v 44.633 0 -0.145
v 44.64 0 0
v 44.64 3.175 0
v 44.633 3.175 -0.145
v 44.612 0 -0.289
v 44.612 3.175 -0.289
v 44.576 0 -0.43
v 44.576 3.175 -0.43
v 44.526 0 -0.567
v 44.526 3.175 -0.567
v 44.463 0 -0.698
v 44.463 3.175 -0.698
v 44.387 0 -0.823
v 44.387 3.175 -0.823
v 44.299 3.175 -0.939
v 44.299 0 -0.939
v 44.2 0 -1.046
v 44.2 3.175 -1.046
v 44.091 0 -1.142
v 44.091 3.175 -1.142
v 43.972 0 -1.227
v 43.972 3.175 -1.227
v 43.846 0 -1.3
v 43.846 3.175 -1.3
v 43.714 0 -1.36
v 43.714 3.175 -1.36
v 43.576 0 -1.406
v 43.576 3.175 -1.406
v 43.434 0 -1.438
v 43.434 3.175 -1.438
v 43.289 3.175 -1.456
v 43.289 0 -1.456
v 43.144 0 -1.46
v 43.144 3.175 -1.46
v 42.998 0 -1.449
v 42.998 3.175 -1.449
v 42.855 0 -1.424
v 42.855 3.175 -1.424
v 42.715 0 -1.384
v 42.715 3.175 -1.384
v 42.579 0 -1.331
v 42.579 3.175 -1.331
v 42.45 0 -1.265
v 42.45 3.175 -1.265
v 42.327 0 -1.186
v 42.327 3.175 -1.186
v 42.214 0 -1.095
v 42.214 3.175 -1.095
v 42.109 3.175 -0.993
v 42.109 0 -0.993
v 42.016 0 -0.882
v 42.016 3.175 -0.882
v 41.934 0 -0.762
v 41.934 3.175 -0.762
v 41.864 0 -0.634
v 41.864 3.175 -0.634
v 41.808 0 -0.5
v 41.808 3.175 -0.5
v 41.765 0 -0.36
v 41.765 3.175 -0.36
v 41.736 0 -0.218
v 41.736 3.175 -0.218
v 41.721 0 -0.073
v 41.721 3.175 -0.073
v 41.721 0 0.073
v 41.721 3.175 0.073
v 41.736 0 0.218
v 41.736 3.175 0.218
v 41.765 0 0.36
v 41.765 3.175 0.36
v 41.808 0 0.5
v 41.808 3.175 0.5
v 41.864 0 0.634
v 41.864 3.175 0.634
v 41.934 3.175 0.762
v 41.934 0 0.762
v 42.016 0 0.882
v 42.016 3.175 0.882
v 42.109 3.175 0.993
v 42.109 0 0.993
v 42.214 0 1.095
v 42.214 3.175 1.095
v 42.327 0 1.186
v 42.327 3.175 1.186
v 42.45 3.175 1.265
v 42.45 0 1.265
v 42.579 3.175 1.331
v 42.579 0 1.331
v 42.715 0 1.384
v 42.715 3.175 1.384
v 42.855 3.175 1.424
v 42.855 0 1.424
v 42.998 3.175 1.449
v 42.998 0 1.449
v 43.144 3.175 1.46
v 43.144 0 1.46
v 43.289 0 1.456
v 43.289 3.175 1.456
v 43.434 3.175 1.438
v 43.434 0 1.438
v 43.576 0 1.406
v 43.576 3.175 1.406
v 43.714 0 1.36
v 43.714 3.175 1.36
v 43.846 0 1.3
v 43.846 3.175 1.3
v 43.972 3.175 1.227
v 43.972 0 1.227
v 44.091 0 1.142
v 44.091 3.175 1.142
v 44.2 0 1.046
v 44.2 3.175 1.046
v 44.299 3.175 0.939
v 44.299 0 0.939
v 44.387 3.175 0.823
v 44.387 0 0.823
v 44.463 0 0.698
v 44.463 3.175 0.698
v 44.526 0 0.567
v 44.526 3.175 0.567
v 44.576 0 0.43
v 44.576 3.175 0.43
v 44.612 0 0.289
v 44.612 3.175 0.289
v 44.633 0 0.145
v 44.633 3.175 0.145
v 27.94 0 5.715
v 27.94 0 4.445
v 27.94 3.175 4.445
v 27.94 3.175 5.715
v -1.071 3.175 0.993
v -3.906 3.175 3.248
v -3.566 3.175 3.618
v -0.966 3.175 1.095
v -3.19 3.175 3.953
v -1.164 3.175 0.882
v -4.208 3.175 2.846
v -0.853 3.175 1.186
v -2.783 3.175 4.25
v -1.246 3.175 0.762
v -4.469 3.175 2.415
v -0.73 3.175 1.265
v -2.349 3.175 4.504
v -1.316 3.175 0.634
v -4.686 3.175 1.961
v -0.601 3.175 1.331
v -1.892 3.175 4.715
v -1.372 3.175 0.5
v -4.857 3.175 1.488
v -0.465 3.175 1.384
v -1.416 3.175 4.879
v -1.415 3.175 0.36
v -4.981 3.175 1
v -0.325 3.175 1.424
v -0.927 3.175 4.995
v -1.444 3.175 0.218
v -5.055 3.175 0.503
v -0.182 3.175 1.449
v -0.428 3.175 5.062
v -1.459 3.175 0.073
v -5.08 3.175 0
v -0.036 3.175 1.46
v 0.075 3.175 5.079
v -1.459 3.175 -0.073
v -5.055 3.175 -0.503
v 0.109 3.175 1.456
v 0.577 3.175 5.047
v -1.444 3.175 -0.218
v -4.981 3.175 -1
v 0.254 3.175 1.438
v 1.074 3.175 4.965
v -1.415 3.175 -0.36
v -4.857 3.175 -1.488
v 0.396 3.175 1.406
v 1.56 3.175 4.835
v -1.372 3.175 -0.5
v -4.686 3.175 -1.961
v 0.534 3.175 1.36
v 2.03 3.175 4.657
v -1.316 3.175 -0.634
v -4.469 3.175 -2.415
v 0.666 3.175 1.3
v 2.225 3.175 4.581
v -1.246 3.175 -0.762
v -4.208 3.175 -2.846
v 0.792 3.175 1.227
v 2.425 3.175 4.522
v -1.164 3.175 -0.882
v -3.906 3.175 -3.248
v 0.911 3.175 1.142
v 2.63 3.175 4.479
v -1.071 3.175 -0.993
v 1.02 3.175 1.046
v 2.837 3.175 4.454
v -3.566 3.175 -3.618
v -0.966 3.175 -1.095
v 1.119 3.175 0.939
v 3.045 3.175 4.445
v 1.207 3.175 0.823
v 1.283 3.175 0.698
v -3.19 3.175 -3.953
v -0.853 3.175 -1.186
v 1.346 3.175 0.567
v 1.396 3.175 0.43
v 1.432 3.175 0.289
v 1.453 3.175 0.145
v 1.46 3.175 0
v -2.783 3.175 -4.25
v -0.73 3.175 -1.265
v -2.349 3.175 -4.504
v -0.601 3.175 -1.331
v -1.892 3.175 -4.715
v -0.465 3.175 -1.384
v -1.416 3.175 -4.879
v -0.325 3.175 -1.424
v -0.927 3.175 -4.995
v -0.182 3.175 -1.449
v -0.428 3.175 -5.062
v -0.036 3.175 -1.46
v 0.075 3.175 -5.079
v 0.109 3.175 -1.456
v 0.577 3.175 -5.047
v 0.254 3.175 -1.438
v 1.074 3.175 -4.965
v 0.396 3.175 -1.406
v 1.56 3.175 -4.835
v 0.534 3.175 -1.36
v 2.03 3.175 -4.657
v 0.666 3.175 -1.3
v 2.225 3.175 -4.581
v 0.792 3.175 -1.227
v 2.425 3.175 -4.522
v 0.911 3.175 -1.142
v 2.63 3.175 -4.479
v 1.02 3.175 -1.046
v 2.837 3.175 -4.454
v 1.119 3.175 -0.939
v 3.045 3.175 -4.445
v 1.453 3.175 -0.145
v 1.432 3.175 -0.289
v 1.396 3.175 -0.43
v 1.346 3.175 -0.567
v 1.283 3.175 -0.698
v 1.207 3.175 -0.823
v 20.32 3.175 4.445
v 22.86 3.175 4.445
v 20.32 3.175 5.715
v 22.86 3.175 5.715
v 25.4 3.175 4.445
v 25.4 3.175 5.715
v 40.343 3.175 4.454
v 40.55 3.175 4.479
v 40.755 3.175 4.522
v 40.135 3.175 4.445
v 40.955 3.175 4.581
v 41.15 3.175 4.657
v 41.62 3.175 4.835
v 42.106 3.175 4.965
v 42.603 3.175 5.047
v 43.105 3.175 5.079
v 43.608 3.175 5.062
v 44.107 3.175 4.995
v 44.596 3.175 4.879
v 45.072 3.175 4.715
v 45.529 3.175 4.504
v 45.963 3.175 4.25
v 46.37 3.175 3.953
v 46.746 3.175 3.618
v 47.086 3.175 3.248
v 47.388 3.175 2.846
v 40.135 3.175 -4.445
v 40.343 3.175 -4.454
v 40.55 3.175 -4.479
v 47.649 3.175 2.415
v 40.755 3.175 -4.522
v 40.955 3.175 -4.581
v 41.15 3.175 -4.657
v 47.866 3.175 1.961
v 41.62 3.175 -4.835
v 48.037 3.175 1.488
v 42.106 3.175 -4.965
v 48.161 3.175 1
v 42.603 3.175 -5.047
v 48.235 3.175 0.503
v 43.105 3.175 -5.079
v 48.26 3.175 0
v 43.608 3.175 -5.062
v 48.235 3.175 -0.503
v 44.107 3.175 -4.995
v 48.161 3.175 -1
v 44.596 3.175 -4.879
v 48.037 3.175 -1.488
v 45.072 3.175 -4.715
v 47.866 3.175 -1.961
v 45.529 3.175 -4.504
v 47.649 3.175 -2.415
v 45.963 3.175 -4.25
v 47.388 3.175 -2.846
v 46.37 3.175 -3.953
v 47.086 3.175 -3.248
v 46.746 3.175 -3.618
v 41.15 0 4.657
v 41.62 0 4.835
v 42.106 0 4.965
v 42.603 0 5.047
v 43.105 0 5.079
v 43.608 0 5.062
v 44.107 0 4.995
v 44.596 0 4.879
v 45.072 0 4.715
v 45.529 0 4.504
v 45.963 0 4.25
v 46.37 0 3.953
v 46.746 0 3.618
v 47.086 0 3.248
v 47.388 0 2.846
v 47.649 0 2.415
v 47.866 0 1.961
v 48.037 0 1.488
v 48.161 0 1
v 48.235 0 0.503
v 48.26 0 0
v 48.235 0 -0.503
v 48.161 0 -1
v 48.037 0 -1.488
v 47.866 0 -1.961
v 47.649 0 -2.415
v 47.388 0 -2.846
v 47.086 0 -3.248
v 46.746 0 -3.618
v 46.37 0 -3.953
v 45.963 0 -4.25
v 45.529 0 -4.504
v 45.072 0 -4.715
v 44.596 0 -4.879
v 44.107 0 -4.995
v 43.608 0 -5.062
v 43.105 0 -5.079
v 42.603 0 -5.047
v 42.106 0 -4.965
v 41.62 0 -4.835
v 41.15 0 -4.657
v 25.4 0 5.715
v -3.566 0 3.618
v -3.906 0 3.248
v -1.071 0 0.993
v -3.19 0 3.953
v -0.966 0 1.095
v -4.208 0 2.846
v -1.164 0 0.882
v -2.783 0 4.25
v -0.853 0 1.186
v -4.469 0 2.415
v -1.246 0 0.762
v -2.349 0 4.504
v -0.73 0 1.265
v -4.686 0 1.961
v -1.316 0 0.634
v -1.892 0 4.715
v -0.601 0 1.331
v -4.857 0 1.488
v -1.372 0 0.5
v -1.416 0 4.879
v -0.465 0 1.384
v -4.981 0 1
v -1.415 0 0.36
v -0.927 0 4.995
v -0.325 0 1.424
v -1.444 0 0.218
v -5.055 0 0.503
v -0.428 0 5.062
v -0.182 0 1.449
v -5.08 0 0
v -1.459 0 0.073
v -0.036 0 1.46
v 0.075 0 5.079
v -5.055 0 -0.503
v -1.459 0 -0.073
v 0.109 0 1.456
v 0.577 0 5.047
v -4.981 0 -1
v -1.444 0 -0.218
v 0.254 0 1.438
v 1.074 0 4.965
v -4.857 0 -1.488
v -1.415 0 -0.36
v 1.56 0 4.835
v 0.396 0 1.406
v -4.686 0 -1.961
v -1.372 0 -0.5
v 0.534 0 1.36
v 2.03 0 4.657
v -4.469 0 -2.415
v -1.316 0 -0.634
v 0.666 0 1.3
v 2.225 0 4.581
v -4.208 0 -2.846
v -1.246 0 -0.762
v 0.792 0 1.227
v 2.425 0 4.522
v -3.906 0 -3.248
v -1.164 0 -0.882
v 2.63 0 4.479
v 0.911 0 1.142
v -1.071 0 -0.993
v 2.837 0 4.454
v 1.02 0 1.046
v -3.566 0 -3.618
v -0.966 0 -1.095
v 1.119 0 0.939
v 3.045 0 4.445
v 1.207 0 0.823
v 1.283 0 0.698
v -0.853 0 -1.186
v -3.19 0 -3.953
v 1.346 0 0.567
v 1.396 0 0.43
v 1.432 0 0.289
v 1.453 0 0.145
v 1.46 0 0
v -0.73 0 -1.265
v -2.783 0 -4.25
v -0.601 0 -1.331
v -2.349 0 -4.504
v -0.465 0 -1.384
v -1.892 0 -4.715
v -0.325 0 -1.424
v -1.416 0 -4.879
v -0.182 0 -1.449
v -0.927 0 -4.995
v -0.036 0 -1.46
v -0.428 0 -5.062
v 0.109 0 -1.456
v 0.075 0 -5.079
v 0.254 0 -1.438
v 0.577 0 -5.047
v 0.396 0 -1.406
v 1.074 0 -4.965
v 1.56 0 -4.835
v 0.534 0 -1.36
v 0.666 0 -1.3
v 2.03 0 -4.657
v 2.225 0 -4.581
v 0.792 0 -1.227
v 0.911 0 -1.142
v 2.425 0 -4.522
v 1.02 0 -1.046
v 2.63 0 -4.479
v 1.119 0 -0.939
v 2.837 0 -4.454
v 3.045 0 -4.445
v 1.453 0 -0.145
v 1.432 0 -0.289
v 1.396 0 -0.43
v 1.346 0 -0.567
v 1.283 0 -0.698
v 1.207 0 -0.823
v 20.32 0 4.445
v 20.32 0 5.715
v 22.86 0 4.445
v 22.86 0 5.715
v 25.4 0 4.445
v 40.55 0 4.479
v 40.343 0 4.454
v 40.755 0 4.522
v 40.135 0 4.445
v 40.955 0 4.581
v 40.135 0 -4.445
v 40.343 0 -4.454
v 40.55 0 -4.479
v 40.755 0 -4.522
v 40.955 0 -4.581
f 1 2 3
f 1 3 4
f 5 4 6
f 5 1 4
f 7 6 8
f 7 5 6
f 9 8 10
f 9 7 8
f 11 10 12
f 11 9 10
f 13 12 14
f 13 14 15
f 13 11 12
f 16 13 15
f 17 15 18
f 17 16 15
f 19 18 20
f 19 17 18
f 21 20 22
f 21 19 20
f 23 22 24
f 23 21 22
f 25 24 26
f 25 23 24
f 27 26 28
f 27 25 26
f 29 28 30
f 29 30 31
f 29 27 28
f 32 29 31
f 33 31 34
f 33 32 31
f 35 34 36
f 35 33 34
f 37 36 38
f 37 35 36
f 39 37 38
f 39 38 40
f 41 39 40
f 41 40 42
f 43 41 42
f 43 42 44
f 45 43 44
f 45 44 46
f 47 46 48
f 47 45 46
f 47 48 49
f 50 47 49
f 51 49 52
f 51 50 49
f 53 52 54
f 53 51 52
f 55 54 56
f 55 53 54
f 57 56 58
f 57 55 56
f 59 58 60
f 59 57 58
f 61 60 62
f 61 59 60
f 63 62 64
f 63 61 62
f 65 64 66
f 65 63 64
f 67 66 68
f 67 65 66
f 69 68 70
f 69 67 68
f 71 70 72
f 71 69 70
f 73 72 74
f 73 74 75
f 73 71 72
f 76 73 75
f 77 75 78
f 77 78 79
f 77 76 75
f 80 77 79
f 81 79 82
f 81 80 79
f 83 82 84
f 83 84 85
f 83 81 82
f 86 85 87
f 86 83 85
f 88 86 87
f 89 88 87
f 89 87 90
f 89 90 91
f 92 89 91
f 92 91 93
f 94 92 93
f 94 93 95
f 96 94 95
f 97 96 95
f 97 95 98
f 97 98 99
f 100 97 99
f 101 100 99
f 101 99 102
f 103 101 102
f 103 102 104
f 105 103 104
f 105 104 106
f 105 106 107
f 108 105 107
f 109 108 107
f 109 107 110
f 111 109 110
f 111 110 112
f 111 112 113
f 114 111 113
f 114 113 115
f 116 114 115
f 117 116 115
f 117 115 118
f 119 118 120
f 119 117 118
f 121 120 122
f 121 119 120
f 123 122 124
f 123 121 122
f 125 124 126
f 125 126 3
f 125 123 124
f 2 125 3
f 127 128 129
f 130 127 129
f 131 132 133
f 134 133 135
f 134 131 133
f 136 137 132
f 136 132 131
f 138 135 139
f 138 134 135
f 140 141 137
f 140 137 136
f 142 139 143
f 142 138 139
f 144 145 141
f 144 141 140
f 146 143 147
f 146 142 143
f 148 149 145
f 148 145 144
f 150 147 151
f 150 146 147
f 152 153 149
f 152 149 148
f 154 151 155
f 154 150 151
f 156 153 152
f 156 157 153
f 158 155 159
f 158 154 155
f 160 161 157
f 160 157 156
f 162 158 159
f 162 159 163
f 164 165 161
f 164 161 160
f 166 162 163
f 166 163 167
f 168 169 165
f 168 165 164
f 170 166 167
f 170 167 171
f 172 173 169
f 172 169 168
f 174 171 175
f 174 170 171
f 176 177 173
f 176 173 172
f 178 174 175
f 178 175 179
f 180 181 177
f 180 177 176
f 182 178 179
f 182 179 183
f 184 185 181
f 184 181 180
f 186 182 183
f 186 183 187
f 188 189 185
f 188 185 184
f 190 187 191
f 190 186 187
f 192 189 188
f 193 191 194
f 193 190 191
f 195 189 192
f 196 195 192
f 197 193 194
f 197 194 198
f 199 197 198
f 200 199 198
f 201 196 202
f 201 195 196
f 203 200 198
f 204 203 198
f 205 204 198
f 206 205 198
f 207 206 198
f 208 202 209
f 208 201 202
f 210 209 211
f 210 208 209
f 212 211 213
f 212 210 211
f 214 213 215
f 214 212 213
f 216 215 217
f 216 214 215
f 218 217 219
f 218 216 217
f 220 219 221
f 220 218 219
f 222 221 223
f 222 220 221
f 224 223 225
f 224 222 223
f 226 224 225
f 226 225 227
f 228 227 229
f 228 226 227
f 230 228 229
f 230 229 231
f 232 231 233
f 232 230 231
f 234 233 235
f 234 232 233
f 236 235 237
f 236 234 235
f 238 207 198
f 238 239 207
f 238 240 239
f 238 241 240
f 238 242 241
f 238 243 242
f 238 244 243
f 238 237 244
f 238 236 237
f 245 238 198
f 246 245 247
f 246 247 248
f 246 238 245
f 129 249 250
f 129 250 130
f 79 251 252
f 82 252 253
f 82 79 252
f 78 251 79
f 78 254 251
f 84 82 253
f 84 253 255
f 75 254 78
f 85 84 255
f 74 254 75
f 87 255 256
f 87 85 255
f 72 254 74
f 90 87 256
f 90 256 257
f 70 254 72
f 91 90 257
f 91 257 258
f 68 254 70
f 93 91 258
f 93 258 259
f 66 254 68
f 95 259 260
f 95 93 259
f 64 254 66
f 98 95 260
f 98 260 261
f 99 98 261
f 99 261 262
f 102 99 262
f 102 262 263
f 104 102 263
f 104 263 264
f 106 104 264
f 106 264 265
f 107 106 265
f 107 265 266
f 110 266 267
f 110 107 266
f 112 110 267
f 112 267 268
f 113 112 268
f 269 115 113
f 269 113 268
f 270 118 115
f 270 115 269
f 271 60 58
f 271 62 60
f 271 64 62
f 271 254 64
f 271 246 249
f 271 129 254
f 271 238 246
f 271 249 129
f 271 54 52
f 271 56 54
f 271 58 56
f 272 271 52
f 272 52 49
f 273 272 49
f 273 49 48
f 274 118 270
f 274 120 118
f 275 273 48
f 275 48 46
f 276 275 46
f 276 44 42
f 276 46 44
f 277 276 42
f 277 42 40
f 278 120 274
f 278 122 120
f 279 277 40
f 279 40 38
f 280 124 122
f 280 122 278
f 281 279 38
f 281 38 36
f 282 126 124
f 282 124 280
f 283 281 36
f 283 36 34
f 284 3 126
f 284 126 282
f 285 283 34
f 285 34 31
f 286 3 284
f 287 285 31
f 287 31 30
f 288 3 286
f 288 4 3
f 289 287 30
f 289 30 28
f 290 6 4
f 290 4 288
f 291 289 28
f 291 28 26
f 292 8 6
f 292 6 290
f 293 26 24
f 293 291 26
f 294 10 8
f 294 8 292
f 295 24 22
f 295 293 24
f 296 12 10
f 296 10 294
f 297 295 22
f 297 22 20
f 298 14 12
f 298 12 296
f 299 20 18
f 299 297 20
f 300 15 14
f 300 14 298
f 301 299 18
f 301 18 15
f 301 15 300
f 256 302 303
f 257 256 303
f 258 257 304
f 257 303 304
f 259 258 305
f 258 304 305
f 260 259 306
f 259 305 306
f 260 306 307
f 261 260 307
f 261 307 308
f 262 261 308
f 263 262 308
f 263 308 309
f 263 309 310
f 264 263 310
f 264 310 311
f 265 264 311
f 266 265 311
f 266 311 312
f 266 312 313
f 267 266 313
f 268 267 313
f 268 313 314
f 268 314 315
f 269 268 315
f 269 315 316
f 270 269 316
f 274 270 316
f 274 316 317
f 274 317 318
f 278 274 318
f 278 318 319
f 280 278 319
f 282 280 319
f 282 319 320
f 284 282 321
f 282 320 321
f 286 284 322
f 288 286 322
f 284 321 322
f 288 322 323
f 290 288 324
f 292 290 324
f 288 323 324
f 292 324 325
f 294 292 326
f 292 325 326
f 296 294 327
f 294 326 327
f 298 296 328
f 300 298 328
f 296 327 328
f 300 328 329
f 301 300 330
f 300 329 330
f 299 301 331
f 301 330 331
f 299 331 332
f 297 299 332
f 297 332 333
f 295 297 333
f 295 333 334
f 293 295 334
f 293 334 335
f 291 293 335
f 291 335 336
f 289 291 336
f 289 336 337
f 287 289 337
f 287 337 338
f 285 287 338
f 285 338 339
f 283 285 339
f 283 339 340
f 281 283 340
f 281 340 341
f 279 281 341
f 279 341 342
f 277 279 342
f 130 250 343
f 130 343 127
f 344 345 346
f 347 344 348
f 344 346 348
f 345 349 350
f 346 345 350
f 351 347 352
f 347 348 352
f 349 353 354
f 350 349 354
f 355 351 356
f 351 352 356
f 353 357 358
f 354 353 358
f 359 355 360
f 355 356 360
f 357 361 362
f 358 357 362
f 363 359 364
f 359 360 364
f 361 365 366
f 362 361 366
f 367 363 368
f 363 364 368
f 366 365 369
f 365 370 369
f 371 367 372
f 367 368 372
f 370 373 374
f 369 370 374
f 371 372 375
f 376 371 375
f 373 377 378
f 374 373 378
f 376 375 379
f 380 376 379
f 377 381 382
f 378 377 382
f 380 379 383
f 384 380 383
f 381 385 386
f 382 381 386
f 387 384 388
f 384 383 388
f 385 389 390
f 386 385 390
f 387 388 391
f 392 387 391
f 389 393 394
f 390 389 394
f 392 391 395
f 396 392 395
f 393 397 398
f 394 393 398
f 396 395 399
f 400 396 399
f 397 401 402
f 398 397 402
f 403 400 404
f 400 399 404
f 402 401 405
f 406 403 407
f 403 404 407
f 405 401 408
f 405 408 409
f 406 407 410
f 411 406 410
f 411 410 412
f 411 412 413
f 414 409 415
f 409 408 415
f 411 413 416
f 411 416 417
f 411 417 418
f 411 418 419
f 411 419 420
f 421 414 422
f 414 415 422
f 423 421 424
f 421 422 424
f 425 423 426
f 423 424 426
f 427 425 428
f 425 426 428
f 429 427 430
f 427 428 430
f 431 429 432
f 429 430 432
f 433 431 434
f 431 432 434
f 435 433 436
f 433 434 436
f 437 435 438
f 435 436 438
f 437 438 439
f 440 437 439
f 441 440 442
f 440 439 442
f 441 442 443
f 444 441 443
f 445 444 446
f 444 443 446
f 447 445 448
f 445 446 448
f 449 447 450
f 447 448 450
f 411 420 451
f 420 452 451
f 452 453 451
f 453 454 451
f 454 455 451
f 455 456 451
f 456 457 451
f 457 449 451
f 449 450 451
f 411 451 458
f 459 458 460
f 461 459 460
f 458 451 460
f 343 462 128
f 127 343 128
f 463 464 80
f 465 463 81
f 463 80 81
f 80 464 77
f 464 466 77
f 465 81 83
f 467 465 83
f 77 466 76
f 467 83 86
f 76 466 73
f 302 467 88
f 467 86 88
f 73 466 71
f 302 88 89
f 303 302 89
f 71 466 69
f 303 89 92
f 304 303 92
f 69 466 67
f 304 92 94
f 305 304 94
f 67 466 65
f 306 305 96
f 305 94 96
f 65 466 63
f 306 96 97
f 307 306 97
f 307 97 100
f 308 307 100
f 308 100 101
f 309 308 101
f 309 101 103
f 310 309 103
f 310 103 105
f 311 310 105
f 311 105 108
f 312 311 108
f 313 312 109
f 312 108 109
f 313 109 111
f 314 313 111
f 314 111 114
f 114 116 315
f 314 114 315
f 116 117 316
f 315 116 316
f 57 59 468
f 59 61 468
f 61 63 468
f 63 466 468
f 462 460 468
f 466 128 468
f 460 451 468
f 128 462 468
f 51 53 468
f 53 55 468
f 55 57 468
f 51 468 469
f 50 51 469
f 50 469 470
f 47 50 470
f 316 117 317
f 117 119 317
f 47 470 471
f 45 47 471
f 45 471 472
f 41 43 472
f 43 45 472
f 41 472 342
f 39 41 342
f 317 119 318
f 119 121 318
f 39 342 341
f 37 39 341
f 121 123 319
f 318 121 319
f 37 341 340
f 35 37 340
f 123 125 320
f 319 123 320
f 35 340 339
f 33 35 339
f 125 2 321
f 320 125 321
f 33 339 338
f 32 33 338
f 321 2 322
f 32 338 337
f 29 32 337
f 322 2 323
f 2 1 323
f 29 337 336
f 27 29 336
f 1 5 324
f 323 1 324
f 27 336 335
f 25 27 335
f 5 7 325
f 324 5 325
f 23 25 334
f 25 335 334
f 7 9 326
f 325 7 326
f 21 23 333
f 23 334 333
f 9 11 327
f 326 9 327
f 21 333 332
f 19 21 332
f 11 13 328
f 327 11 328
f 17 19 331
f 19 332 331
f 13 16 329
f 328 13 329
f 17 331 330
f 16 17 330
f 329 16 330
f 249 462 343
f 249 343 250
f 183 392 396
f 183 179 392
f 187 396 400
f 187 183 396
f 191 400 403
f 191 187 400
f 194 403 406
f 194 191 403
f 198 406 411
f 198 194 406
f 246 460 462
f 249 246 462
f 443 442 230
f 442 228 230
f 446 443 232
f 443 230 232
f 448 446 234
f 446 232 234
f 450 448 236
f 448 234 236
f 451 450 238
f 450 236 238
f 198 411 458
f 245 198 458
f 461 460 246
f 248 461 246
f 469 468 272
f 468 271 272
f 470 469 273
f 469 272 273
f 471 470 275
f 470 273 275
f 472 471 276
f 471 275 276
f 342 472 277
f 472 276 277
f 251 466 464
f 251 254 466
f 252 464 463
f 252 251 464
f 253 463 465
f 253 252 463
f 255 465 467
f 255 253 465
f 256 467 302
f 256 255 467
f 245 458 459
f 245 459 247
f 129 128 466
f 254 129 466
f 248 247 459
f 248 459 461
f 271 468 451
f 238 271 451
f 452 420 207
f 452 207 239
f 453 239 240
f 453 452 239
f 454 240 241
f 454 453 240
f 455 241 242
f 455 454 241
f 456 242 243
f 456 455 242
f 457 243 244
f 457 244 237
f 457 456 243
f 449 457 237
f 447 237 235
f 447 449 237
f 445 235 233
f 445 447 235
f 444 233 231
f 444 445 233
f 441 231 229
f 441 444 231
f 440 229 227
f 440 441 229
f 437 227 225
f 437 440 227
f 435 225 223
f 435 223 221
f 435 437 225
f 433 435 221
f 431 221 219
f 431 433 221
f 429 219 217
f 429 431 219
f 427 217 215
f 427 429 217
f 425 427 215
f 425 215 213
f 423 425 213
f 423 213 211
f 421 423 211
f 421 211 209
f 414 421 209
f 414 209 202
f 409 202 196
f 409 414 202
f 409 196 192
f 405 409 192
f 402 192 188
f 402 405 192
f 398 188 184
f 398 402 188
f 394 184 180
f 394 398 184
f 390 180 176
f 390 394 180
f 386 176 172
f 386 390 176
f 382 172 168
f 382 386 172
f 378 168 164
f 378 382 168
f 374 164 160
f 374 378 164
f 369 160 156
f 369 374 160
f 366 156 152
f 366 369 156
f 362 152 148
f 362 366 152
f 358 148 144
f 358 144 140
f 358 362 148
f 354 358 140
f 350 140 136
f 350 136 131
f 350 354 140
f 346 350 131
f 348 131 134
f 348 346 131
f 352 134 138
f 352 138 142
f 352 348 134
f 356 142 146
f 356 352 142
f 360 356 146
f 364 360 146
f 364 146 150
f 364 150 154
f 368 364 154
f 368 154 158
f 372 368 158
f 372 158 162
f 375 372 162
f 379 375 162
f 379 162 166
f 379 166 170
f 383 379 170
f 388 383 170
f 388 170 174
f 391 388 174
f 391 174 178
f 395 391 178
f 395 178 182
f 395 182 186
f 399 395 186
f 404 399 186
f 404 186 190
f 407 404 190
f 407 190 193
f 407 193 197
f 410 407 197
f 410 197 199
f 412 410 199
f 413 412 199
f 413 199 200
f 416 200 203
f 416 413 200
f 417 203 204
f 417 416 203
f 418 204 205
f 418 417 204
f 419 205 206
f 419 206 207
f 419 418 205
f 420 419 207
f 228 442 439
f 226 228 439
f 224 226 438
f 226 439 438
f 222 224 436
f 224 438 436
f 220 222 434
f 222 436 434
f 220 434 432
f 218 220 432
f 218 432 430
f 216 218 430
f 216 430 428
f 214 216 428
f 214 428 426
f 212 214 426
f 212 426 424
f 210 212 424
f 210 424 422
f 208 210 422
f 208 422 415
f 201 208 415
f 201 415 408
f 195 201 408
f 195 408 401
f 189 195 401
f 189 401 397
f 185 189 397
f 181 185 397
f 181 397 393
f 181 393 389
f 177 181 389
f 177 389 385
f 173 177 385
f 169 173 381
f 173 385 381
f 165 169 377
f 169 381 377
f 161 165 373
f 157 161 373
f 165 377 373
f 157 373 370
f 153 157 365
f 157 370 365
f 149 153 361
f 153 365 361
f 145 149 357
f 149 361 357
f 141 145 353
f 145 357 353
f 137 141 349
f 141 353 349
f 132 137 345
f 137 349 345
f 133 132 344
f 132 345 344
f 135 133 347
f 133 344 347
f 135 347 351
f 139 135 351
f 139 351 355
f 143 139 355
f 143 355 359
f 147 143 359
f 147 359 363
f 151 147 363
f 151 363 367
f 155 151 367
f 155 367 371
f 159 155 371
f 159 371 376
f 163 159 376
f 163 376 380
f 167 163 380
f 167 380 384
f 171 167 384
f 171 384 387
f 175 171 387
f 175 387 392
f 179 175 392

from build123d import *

# Parameters (mm, degrees)
SKETCH1_R           = 5.08
SKETCH1_R_2         = 1.4605
BOSS_EXTRUDE1_DEPTH = 3.175
FILLET1_R           = 2.54
SKETCH2_W           = 2.54
SKETCH2_H           = 3.175
BOSS_EXTRUDE2_DEPTH = 1.27


with BuildPart() as part:
    # Sketch1 → Boss-Extrude1 (new body)
    with BuildSketch(Plane(origin=(0, 0, 0), x_dir=(1, 0, 0), z_dir=(0, 1, 0))):
        Circle(SKETCH1_R)
        Circle(SKETCH1_R_2, mode=Mode.SUBTRACT)
        with BuildLine():
            Line((40.720655575, 4.445), (2.459344425, 4.445))
            ThreePointArc((2.459344425, 4.445), (4.376063852, 2.580012628), (5.08, 0))
            ThreePointArc((5.08, 0), (4.376063852, -2.580012628), (2.459344425, -4.445))
            Line((2.459344425, -4.445), (40.720655575, -4.445))
            ThreePointArc((40.720655575, -4.445), (38.1, 0), (40.720655575, 4.445))
        make_face()
        with Locations((43.18, 0)):
            Circle(SKETCH1_R)
        with Locations((43.18, 0)):
            Circle(SKETCH1_R_2, mode=Mode.SUBTRACT)
    extrude(amount=BOSS_EXTRUDE1_DEPTH)

    # Fillet1
    fillet1_edges = [part.edges().sort_by_distance(p)[0] for p in [
        (2.459344425, 1.5875, -4.445),
        (40.720655575, 1.5875, -4.445),
        (40.720655575, 1.5875, 4.445),
        (2.459344425, 1.5875, 4.445),
    ]]
    fillet(fillet1_edges, radius=FILLET1_R)

    # Sketch2 → Boss-Extrude2 (add)
    with BuildSketch(Plane.XY.offset(4.445)):
        with Locations((26.67, 1.5875)):
            Rectangle(SKETCH2_W, SKETCH2_H)
        with Locations((21.59, 1.5875)):
            Rectangle(SKETCH2_W, SKETCH2_H)
    extrude(amount=BOSS_EXTRUDE2_DEPTH)


solid = part.part
